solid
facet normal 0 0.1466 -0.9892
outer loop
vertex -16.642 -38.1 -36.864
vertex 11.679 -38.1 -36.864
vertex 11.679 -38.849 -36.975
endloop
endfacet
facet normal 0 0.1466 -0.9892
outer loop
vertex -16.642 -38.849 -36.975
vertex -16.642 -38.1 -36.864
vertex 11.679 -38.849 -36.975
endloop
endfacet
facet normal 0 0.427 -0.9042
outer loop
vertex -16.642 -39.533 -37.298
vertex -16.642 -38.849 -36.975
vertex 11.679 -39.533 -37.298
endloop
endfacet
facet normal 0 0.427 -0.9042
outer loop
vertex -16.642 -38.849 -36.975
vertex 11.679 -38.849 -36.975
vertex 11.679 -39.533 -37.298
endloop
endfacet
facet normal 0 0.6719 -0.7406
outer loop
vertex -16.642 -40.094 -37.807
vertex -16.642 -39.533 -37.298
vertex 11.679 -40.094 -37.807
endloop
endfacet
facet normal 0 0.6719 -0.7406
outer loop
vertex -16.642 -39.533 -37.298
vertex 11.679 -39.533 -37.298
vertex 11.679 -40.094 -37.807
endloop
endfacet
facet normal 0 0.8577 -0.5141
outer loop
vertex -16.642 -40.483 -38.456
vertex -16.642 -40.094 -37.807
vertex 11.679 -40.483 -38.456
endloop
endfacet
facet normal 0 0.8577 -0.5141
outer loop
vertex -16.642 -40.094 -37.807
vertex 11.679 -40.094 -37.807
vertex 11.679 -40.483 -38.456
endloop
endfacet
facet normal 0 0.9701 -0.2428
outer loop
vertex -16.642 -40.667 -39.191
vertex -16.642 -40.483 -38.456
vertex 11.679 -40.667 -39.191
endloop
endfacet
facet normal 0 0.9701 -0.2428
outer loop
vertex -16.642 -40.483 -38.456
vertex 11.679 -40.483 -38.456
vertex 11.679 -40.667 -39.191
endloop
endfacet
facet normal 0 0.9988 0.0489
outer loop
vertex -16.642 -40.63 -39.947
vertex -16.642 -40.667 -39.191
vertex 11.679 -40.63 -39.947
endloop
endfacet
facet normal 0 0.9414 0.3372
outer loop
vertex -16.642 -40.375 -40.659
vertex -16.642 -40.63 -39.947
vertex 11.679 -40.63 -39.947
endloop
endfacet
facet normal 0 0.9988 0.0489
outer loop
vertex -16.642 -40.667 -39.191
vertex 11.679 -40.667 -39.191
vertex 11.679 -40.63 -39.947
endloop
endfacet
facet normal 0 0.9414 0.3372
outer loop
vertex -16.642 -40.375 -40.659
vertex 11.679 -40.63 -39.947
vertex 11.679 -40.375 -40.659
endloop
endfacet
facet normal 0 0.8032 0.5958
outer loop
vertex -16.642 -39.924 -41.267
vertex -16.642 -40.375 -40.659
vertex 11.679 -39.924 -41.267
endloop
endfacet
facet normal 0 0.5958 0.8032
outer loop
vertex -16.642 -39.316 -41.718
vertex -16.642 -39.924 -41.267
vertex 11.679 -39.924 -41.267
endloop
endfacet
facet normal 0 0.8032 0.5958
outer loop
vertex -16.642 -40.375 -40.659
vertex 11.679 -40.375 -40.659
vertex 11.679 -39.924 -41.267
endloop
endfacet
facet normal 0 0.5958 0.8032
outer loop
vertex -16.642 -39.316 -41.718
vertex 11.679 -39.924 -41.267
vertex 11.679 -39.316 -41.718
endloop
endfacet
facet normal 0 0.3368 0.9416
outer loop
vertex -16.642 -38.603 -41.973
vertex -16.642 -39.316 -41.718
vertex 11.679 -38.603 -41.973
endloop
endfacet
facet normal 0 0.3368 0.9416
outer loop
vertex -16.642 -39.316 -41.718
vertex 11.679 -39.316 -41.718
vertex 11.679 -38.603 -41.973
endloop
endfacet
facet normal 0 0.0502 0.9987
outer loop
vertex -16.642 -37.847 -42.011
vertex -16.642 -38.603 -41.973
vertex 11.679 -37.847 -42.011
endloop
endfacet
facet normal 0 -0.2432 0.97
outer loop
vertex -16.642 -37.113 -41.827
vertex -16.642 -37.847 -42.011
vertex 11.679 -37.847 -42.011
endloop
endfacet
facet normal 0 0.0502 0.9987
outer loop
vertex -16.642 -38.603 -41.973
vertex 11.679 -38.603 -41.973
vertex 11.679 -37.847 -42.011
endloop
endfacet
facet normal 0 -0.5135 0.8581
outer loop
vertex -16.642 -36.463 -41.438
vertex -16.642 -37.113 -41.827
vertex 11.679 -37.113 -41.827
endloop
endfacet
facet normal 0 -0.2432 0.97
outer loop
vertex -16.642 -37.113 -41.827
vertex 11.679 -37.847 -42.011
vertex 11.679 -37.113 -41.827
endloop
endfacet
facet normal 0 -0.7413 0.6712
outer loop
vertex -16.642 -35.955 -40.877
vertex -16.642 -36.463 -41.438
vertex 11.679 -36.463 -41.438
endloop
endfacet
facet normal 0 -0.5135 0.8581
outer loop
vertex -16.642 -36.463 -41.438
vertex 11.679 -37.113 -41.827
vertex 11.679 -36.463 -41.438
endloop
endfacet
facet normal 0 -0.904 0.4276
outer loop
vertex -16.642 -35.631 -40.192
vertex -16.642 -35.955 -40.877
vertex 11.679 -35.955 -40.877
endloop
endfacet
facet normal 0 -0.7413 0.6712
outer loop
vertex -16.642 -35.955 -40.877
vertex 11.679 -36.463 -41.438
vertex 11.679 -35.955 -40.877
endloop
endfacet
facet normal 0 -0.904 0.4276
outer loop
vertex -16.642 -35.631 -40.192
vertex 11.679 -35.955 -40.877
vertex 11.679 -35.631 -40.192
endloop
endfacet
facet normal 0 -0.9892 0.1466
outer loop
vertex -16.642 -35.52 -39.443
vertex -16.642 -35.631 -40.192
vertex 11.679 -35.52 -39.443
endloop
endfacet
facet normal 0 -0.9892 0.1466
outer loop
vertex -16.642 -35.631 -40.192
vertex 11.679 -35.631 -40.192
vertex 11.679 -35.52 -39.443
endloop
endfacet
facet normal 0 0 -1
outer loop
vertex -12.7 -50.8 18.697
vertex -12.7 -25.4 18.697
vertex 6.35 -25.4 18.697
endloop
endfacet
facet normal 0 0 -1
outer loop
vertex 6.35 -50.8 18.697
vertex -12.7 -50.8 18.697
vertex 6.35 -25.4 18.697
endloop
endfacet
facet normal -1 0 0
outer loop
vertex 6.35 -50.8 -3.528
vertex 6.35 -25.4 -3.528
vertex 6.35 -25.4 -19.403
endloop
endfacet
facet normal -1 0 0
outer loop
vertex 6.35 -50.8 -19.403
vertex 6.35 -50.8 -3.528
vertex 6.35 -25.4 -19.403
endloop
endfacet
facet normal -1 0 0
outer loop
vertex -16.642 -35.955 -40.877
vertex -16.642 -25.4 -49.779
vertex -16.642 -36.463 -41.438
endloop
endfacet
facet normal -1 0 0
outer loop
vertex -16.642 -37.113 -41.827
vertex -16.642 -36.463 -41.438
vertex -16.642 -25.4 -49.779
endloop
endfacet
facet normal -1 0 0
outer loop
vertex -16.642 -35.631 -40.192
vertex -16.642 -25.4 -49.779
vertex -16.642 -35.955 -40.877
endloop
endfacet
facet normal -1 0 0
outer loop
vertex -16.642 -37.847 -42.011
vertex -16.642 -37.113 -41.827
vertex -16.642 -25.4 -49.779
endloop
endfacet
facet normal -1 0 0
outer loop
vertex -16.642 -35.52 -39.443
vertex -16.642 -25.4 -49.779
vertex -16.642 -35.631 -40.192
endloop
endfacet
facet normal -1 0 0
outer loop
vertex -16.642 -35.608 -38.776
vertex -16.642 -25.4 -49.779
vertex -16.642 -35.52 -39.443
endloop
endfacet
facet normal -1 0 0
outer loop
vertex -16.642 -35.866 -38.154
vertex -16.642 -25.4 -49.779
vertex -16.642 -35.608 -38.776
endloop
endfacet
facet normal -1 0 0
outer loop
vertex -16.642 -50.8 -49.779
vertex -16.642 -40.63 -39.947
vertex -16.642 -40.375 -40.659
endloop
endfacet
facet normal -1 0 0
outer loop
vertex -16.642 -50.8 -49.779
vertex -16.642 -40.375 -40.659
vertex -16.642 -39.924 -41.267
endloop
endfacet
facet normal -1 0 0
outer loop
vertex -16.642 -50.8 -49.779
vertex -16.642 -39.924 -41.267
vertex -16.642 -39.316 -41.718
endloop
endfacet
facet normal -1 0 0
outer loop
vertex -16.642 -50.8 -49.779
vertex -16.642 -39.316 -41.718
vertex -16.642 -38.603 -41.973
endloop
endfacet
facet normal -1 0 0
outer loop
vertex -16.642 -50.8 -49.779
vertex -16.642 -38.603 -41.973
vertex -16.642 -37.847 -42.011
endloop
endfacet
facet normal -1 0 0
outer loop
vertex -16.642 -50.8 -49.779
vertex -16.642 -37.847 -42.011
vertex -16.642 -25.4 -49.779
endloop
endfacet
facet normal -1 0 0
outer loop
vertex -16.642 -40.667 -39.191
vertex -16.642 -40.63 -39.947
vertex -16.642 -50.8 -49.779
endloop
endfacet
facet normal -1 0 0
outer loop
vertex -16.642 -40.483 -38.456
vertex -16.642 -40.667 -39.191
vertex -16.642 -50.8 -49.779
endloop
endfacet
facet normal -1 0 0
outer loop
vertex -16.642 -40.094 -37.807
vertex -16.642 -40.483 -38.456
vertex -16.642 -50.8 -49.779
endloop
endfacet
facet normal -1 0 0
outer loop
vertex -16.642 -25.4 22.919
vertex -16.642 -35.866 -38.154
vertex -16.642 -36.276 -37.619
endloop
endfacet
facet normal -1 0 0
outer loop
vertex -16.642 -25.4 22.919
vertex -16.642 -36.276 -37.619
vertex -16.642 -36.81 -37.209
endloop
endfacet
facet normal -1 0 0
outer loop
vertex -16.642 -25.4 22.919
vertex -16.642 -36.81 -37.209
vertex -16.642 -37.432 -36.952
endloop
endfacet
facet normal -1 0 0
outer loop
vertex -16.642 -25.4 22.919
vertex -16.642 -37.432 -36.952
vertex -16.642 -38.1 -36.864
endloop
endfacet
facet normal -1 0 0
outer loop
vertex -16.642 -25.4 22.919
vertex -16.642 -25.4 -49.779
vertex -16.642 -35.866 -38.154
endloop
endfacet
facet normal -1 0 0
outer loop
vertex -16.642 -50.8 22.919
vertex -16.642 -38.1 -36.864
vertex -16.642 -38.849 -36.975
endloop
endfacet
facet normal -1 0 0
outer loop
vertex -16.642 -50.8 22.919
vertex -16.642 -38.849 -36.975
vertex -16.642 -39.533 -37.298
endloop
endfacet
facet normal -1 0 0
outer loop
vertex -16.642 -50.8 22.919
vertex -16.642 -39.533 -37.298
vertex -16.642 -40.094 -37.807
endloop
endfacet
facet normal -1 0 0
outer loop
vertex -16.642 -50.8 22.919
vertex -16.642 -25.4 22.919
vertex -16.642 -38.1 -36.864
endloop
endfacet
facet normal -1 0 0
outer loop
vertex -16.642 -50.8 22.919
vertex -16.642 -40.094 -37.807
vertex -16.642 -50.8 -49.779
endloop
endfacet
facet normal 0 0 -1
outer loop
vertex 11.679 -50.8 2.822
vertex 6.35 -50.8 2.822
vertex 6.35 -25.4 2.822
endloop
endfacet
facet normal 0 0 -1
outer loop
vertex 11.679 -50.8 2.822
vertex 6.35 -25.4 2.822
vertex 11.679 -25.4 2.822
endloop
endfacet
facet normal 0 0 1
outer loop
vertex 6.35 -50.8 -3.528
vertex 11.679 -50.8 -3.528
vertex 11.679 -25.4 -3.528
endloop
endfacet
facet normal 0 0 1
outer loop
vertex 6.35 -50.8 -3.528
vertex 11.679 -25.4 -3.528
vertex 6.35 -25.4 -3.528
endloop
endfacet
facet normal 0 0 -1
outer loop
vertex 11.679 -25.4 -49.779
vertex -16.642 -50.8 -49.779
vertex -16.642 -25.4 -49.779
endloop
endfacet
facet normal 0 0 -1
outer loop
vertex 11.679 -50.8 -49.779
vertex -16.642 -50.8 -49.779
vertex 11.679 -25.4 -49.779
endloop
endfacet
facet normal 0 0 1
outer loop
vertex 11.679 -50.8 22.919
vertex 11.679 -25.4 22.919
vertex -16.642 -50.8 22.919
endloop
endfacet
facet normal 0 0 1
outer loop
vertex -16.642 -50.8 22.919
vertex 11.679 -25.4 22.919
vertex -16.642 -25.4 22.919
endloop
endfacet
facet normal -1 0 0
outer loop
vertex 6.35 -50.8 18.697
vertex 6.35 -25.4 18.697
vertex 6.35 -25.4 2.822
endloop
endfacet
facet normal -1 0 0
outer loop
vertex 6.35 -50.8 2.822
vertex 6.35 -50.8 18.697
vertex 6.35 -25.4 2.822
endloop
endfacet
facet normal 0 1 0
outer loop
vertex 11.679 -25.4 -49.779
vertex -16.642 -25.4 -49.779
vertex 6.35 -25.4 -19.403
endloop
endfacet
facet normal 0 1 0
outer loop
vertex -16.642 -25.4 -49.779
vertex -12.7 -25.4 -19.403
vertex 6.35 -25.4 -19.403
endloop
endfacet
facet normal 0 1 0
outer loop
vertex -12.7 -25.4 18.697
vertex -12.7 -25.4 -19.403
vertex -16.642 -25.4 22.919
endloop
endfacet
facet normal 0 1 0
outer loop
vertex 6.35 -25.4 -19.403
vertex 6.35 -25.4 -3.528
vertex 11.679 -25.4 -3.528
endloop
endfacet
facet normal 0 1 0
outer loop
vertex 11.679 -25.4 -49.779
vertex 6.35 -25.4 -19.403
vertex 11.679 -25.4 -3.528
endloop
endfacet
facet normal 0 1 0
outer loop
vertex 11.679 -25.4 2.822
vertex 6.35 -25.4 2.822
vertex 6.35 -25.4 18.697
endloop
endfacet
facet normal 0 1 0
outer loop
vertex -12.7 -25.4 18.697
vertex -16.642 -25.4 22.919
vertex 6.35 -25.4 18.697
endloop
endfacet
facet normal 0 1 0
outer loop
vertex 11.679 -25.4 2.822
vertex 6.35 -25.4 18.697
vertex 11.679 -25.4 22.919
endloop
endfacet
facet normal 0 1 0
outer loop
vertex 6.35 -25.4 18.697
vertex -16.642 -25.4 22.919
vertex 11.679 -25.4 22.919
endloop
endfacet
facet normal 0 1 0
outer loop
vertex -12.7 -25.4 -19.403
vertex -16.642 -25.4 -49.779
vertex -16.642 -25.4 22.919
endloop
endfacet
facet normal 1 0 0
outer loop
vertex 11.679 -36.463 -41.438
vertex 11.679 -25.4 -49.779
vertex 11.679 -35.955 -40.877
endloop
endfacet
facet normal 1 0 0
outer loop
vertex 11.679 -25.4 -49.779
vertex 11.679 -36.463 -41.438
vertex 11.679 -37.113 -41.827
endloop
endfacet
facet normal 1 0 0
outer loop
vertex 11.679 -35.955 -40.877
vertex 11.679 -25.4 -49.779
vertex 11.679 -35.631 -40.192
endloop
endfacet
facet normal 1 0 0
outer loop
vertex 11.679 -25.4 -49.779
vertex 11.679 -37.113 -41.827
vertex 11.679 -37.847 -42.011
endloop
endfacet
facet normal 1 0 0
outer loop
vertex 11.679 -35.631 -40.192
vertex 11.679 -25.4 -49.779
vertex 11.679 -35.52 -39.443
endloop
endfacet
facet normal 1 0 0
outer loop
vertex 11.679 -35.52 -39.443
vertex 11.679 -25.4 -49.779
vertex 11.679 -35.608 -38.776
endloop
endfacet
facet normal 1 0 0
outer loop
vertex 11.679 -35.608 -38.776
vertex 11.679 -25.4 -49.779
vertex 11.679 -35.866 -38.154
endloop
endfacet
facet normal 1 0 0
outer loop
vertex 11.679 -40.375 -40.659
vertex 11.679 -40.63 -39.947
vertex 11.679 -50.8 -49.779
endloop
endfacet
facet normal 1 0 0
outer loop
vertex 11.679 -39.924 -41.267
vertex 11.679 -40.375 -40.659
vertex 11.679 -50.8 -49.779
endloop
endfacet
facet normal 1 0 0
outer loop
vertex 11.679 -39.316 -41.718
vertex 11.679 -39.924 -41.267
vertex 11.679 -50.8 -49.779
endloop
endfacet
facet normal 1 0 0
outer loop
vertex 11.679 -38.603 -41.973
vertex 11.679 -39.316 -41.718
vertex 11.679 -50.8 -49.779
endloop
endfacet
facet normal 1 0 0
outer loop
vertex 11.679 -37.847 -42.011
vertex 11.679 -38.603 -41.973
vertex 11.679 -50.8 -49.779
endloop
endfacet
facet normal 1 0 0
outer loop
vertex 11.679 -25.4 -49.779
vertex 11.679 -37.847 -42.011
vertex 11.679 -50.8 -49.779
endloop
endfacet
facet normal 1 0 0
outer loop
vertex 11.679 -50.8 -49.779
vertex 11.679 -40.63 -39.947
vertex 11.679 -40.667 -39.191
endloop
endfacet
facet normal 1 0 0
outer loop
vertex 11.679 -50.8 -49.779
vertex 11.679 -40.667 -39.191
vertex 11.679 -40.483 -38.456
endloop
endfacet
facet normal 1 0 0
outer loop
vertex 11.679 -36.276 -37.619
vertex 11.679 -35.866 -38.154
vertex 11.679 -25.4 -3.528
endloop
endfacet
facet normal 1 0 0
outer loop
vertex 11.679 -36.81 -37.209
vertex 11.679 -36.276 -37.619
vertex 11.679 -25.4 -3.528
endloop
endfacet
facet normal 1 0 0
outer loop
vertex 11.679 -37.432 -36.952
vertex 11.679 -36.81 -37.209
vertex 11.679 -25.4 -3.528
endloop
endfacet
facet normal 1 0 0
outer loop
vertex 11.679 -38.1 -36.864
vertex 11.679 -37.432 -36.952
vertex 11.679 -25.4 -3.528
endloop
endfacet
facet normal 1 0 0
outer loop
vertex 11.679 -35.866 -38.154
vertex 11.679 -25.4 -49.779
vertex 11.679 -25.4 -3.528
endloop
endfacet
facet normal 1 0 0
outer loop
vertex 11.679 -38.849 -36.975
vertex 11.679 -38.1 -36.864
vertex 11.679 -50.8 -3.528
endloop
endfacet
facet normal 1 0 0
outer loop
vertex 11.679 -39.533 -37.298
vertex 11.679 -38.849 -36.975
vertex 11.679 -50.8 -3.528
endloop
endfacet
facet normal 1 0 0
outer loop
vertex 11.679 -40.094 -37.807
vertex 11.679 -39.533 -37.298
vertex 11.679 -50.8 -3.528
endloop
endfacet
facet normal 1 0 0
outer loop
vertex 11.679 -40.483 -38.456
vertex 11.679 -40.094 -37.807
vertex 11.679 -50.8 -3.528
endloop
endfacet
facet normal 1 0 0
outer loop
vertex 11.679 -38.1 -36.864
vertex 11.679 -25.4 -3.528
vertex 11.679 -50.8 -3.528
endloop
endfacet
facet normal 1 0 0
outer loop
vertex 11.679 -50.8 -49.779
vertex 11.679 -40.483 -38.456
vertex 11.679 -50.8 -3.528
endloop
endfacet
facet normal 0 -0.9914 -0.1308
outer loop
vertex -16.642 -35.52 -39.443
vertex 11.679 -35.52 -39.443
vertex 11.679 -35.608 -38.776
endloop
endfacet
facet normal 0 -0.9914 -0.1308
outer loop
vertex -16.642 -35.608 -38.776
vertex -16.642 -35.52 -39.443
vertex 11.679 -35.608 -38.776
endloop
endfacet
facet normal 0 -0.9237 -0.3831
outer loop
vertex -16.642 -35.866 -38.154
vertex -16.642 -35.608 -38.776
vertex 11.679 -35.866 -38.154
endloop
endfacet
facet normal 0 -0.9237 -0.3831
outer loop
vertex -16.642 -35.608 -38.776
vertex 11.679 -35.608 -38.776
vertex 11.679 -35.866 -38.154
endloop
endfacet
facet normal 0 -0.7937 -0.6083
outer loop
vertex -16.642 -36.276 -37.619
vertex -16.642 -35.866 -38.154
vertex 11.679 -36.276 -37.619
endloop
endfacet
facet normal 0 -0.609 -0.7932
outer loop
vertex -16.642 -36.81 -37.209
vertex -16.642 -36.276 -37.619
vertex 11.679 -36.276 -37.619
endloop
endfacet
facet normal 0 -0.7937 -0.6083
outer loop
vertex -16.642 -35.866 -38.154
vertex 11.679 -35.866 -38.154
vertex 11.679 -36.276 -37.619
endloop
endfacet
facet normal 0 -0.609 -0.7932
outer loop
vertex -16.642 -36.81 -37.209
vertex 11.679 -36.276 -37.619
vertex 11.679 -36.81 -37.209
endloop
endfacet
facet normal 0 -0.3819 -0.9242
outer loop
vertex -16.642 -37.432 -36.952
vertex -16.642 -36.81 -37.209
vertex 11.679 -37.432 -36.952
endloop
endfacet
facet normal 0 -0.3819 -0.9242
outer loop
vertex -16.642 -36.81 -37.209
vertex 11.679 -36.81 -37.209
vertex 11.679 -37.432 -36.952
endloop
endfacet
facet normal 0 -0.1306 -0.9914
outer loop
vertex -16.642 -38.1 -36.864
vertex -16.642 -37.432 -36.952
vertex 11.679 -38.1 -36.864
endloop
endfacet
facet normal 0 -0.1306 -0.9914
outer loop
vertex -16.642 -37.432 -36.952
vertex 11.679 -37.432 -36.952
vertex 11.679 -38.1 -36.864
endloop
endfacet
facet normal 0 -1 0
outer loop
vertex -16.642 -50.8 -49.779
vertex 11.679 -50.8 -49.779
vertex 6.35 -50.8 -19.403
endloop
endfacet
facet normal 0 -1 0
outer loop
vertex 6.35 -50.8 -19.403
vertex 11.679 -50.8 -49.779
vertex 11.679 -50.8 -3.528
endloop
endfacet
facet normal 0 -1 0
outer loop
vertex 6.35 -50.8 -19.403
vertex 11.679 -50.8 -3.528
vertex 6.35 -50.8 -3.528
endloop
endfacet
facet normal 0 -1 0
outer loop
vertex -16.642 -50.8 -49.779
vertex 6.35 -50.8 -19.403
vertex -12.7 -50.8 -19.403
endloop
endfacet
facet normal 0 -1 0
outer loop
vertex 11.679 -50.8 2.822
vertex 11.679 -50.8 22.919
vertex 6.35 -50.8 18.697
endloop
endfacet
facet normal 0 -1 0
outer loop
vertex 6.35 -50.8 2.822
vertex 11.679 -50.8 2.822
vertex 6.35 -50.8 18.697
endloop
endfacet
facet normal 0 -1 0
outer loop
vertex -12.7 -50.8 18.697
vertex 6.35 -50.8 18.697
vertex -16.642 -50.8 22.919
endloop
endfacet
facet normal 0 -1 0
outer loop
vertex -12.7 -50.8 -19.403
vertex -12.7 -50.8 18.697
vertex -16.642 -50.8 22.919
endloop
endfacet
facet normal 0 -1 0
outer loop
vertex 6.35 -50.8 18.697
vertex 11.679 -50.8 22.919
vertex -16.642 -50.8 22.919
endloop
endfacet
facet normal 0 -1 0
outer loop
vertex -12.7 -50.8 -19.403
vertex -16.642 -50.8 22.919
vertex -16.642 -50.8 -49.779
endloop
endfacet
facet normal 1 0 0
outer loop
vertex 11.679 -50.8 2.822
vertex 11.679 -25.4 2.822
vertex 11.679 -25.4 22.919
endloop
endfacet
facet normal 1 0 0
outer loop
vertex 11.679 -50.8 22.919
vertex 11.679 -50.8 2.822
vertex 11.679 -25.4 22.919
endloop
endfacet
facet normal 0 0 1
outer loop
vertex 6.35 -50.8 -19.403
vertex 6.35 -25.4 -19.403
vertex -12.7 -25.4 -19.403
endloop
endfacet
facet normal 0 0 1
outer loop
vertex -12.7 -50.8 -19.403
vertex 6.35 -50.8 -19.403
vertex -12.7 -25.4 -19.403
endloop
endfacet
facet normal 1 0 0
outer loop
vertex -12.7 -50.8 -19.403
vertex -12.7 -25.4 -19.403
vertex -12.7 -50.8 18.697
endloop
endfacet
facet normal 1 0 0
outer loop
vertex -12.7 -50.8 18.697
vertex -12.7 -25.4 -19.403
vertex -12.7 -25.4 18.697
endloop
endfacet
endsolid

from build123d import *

# Parameters (mm, degrees)
F2_DEPTH = 25.4
F3_W     = 6.35
F3_H     = 25.4
F3_W_2   = 15.6204670995
F4_DEPTH = 25.4
F6_DEPTH = 38.1


# Not quite as in the source:
# - a feature names something its author has since deleted; it is built from what else it names


with BuildPart() as f2:
    # F1 (on offset) → F2 (new body)
    with BuildSketch(Plane.XZ.offset(25.4)):
        Polygon((-12.7, -19.4027777778), (-12.7, 18.6972222222), (6.35, 18.6972222222), (6.35, 2.8222222222), (11.6785410792, 2.8222222222), (11.6785410792, 22.9191370308), (-16.6419260204, 22.9191370308), (-16.6419260204, -24.3789628148), (11.6785410792, -24.3789628148), (11.6785410792, -3.5277777778), (6.35, -3.5277777778), (6.35, -19.4027777778), align=None)
    extrude(amount=F2_DEPTH)

    # F3 (on face) → F4 (join)
    with BuildSketch(Plane(origin=(0, 0, -24.3789628148), x_dir=(1, 0, 0), z_dir=(0, 0, -1))):
        with Locations((-13.4669260204, 38.1)):
            Rectangle(F3_W, F3_H)
        with Locations((8.5035410792, 38.1)):
            Rectangle(F3_W, F3_H)
        with Locations((-2.4816924706, 38.1)):
            Rectangle(F3_W_2, F3_H)
    extrude(amount=F4_DEPTH)

    # F5 (on face) → F6 (cut)
    with BuildSketch(Plane.YZ.offset(11.6785410792)):
        with BuildLine():
            ThreePointArc((-35.5203125, -39.4433777778), (-36.2758854754, -37.6192632532), (-38.1, -36.8636902778))
            ThreePointArc((-38.1, -36.8636902778), (-39.9241145246, -41.2674923024), (-35.5203125, -39.4433777778))
        make_face()
    extrude(amount=-F6_DEPTH, mode=Mode.SUBTRACT)


solid = f2.part
